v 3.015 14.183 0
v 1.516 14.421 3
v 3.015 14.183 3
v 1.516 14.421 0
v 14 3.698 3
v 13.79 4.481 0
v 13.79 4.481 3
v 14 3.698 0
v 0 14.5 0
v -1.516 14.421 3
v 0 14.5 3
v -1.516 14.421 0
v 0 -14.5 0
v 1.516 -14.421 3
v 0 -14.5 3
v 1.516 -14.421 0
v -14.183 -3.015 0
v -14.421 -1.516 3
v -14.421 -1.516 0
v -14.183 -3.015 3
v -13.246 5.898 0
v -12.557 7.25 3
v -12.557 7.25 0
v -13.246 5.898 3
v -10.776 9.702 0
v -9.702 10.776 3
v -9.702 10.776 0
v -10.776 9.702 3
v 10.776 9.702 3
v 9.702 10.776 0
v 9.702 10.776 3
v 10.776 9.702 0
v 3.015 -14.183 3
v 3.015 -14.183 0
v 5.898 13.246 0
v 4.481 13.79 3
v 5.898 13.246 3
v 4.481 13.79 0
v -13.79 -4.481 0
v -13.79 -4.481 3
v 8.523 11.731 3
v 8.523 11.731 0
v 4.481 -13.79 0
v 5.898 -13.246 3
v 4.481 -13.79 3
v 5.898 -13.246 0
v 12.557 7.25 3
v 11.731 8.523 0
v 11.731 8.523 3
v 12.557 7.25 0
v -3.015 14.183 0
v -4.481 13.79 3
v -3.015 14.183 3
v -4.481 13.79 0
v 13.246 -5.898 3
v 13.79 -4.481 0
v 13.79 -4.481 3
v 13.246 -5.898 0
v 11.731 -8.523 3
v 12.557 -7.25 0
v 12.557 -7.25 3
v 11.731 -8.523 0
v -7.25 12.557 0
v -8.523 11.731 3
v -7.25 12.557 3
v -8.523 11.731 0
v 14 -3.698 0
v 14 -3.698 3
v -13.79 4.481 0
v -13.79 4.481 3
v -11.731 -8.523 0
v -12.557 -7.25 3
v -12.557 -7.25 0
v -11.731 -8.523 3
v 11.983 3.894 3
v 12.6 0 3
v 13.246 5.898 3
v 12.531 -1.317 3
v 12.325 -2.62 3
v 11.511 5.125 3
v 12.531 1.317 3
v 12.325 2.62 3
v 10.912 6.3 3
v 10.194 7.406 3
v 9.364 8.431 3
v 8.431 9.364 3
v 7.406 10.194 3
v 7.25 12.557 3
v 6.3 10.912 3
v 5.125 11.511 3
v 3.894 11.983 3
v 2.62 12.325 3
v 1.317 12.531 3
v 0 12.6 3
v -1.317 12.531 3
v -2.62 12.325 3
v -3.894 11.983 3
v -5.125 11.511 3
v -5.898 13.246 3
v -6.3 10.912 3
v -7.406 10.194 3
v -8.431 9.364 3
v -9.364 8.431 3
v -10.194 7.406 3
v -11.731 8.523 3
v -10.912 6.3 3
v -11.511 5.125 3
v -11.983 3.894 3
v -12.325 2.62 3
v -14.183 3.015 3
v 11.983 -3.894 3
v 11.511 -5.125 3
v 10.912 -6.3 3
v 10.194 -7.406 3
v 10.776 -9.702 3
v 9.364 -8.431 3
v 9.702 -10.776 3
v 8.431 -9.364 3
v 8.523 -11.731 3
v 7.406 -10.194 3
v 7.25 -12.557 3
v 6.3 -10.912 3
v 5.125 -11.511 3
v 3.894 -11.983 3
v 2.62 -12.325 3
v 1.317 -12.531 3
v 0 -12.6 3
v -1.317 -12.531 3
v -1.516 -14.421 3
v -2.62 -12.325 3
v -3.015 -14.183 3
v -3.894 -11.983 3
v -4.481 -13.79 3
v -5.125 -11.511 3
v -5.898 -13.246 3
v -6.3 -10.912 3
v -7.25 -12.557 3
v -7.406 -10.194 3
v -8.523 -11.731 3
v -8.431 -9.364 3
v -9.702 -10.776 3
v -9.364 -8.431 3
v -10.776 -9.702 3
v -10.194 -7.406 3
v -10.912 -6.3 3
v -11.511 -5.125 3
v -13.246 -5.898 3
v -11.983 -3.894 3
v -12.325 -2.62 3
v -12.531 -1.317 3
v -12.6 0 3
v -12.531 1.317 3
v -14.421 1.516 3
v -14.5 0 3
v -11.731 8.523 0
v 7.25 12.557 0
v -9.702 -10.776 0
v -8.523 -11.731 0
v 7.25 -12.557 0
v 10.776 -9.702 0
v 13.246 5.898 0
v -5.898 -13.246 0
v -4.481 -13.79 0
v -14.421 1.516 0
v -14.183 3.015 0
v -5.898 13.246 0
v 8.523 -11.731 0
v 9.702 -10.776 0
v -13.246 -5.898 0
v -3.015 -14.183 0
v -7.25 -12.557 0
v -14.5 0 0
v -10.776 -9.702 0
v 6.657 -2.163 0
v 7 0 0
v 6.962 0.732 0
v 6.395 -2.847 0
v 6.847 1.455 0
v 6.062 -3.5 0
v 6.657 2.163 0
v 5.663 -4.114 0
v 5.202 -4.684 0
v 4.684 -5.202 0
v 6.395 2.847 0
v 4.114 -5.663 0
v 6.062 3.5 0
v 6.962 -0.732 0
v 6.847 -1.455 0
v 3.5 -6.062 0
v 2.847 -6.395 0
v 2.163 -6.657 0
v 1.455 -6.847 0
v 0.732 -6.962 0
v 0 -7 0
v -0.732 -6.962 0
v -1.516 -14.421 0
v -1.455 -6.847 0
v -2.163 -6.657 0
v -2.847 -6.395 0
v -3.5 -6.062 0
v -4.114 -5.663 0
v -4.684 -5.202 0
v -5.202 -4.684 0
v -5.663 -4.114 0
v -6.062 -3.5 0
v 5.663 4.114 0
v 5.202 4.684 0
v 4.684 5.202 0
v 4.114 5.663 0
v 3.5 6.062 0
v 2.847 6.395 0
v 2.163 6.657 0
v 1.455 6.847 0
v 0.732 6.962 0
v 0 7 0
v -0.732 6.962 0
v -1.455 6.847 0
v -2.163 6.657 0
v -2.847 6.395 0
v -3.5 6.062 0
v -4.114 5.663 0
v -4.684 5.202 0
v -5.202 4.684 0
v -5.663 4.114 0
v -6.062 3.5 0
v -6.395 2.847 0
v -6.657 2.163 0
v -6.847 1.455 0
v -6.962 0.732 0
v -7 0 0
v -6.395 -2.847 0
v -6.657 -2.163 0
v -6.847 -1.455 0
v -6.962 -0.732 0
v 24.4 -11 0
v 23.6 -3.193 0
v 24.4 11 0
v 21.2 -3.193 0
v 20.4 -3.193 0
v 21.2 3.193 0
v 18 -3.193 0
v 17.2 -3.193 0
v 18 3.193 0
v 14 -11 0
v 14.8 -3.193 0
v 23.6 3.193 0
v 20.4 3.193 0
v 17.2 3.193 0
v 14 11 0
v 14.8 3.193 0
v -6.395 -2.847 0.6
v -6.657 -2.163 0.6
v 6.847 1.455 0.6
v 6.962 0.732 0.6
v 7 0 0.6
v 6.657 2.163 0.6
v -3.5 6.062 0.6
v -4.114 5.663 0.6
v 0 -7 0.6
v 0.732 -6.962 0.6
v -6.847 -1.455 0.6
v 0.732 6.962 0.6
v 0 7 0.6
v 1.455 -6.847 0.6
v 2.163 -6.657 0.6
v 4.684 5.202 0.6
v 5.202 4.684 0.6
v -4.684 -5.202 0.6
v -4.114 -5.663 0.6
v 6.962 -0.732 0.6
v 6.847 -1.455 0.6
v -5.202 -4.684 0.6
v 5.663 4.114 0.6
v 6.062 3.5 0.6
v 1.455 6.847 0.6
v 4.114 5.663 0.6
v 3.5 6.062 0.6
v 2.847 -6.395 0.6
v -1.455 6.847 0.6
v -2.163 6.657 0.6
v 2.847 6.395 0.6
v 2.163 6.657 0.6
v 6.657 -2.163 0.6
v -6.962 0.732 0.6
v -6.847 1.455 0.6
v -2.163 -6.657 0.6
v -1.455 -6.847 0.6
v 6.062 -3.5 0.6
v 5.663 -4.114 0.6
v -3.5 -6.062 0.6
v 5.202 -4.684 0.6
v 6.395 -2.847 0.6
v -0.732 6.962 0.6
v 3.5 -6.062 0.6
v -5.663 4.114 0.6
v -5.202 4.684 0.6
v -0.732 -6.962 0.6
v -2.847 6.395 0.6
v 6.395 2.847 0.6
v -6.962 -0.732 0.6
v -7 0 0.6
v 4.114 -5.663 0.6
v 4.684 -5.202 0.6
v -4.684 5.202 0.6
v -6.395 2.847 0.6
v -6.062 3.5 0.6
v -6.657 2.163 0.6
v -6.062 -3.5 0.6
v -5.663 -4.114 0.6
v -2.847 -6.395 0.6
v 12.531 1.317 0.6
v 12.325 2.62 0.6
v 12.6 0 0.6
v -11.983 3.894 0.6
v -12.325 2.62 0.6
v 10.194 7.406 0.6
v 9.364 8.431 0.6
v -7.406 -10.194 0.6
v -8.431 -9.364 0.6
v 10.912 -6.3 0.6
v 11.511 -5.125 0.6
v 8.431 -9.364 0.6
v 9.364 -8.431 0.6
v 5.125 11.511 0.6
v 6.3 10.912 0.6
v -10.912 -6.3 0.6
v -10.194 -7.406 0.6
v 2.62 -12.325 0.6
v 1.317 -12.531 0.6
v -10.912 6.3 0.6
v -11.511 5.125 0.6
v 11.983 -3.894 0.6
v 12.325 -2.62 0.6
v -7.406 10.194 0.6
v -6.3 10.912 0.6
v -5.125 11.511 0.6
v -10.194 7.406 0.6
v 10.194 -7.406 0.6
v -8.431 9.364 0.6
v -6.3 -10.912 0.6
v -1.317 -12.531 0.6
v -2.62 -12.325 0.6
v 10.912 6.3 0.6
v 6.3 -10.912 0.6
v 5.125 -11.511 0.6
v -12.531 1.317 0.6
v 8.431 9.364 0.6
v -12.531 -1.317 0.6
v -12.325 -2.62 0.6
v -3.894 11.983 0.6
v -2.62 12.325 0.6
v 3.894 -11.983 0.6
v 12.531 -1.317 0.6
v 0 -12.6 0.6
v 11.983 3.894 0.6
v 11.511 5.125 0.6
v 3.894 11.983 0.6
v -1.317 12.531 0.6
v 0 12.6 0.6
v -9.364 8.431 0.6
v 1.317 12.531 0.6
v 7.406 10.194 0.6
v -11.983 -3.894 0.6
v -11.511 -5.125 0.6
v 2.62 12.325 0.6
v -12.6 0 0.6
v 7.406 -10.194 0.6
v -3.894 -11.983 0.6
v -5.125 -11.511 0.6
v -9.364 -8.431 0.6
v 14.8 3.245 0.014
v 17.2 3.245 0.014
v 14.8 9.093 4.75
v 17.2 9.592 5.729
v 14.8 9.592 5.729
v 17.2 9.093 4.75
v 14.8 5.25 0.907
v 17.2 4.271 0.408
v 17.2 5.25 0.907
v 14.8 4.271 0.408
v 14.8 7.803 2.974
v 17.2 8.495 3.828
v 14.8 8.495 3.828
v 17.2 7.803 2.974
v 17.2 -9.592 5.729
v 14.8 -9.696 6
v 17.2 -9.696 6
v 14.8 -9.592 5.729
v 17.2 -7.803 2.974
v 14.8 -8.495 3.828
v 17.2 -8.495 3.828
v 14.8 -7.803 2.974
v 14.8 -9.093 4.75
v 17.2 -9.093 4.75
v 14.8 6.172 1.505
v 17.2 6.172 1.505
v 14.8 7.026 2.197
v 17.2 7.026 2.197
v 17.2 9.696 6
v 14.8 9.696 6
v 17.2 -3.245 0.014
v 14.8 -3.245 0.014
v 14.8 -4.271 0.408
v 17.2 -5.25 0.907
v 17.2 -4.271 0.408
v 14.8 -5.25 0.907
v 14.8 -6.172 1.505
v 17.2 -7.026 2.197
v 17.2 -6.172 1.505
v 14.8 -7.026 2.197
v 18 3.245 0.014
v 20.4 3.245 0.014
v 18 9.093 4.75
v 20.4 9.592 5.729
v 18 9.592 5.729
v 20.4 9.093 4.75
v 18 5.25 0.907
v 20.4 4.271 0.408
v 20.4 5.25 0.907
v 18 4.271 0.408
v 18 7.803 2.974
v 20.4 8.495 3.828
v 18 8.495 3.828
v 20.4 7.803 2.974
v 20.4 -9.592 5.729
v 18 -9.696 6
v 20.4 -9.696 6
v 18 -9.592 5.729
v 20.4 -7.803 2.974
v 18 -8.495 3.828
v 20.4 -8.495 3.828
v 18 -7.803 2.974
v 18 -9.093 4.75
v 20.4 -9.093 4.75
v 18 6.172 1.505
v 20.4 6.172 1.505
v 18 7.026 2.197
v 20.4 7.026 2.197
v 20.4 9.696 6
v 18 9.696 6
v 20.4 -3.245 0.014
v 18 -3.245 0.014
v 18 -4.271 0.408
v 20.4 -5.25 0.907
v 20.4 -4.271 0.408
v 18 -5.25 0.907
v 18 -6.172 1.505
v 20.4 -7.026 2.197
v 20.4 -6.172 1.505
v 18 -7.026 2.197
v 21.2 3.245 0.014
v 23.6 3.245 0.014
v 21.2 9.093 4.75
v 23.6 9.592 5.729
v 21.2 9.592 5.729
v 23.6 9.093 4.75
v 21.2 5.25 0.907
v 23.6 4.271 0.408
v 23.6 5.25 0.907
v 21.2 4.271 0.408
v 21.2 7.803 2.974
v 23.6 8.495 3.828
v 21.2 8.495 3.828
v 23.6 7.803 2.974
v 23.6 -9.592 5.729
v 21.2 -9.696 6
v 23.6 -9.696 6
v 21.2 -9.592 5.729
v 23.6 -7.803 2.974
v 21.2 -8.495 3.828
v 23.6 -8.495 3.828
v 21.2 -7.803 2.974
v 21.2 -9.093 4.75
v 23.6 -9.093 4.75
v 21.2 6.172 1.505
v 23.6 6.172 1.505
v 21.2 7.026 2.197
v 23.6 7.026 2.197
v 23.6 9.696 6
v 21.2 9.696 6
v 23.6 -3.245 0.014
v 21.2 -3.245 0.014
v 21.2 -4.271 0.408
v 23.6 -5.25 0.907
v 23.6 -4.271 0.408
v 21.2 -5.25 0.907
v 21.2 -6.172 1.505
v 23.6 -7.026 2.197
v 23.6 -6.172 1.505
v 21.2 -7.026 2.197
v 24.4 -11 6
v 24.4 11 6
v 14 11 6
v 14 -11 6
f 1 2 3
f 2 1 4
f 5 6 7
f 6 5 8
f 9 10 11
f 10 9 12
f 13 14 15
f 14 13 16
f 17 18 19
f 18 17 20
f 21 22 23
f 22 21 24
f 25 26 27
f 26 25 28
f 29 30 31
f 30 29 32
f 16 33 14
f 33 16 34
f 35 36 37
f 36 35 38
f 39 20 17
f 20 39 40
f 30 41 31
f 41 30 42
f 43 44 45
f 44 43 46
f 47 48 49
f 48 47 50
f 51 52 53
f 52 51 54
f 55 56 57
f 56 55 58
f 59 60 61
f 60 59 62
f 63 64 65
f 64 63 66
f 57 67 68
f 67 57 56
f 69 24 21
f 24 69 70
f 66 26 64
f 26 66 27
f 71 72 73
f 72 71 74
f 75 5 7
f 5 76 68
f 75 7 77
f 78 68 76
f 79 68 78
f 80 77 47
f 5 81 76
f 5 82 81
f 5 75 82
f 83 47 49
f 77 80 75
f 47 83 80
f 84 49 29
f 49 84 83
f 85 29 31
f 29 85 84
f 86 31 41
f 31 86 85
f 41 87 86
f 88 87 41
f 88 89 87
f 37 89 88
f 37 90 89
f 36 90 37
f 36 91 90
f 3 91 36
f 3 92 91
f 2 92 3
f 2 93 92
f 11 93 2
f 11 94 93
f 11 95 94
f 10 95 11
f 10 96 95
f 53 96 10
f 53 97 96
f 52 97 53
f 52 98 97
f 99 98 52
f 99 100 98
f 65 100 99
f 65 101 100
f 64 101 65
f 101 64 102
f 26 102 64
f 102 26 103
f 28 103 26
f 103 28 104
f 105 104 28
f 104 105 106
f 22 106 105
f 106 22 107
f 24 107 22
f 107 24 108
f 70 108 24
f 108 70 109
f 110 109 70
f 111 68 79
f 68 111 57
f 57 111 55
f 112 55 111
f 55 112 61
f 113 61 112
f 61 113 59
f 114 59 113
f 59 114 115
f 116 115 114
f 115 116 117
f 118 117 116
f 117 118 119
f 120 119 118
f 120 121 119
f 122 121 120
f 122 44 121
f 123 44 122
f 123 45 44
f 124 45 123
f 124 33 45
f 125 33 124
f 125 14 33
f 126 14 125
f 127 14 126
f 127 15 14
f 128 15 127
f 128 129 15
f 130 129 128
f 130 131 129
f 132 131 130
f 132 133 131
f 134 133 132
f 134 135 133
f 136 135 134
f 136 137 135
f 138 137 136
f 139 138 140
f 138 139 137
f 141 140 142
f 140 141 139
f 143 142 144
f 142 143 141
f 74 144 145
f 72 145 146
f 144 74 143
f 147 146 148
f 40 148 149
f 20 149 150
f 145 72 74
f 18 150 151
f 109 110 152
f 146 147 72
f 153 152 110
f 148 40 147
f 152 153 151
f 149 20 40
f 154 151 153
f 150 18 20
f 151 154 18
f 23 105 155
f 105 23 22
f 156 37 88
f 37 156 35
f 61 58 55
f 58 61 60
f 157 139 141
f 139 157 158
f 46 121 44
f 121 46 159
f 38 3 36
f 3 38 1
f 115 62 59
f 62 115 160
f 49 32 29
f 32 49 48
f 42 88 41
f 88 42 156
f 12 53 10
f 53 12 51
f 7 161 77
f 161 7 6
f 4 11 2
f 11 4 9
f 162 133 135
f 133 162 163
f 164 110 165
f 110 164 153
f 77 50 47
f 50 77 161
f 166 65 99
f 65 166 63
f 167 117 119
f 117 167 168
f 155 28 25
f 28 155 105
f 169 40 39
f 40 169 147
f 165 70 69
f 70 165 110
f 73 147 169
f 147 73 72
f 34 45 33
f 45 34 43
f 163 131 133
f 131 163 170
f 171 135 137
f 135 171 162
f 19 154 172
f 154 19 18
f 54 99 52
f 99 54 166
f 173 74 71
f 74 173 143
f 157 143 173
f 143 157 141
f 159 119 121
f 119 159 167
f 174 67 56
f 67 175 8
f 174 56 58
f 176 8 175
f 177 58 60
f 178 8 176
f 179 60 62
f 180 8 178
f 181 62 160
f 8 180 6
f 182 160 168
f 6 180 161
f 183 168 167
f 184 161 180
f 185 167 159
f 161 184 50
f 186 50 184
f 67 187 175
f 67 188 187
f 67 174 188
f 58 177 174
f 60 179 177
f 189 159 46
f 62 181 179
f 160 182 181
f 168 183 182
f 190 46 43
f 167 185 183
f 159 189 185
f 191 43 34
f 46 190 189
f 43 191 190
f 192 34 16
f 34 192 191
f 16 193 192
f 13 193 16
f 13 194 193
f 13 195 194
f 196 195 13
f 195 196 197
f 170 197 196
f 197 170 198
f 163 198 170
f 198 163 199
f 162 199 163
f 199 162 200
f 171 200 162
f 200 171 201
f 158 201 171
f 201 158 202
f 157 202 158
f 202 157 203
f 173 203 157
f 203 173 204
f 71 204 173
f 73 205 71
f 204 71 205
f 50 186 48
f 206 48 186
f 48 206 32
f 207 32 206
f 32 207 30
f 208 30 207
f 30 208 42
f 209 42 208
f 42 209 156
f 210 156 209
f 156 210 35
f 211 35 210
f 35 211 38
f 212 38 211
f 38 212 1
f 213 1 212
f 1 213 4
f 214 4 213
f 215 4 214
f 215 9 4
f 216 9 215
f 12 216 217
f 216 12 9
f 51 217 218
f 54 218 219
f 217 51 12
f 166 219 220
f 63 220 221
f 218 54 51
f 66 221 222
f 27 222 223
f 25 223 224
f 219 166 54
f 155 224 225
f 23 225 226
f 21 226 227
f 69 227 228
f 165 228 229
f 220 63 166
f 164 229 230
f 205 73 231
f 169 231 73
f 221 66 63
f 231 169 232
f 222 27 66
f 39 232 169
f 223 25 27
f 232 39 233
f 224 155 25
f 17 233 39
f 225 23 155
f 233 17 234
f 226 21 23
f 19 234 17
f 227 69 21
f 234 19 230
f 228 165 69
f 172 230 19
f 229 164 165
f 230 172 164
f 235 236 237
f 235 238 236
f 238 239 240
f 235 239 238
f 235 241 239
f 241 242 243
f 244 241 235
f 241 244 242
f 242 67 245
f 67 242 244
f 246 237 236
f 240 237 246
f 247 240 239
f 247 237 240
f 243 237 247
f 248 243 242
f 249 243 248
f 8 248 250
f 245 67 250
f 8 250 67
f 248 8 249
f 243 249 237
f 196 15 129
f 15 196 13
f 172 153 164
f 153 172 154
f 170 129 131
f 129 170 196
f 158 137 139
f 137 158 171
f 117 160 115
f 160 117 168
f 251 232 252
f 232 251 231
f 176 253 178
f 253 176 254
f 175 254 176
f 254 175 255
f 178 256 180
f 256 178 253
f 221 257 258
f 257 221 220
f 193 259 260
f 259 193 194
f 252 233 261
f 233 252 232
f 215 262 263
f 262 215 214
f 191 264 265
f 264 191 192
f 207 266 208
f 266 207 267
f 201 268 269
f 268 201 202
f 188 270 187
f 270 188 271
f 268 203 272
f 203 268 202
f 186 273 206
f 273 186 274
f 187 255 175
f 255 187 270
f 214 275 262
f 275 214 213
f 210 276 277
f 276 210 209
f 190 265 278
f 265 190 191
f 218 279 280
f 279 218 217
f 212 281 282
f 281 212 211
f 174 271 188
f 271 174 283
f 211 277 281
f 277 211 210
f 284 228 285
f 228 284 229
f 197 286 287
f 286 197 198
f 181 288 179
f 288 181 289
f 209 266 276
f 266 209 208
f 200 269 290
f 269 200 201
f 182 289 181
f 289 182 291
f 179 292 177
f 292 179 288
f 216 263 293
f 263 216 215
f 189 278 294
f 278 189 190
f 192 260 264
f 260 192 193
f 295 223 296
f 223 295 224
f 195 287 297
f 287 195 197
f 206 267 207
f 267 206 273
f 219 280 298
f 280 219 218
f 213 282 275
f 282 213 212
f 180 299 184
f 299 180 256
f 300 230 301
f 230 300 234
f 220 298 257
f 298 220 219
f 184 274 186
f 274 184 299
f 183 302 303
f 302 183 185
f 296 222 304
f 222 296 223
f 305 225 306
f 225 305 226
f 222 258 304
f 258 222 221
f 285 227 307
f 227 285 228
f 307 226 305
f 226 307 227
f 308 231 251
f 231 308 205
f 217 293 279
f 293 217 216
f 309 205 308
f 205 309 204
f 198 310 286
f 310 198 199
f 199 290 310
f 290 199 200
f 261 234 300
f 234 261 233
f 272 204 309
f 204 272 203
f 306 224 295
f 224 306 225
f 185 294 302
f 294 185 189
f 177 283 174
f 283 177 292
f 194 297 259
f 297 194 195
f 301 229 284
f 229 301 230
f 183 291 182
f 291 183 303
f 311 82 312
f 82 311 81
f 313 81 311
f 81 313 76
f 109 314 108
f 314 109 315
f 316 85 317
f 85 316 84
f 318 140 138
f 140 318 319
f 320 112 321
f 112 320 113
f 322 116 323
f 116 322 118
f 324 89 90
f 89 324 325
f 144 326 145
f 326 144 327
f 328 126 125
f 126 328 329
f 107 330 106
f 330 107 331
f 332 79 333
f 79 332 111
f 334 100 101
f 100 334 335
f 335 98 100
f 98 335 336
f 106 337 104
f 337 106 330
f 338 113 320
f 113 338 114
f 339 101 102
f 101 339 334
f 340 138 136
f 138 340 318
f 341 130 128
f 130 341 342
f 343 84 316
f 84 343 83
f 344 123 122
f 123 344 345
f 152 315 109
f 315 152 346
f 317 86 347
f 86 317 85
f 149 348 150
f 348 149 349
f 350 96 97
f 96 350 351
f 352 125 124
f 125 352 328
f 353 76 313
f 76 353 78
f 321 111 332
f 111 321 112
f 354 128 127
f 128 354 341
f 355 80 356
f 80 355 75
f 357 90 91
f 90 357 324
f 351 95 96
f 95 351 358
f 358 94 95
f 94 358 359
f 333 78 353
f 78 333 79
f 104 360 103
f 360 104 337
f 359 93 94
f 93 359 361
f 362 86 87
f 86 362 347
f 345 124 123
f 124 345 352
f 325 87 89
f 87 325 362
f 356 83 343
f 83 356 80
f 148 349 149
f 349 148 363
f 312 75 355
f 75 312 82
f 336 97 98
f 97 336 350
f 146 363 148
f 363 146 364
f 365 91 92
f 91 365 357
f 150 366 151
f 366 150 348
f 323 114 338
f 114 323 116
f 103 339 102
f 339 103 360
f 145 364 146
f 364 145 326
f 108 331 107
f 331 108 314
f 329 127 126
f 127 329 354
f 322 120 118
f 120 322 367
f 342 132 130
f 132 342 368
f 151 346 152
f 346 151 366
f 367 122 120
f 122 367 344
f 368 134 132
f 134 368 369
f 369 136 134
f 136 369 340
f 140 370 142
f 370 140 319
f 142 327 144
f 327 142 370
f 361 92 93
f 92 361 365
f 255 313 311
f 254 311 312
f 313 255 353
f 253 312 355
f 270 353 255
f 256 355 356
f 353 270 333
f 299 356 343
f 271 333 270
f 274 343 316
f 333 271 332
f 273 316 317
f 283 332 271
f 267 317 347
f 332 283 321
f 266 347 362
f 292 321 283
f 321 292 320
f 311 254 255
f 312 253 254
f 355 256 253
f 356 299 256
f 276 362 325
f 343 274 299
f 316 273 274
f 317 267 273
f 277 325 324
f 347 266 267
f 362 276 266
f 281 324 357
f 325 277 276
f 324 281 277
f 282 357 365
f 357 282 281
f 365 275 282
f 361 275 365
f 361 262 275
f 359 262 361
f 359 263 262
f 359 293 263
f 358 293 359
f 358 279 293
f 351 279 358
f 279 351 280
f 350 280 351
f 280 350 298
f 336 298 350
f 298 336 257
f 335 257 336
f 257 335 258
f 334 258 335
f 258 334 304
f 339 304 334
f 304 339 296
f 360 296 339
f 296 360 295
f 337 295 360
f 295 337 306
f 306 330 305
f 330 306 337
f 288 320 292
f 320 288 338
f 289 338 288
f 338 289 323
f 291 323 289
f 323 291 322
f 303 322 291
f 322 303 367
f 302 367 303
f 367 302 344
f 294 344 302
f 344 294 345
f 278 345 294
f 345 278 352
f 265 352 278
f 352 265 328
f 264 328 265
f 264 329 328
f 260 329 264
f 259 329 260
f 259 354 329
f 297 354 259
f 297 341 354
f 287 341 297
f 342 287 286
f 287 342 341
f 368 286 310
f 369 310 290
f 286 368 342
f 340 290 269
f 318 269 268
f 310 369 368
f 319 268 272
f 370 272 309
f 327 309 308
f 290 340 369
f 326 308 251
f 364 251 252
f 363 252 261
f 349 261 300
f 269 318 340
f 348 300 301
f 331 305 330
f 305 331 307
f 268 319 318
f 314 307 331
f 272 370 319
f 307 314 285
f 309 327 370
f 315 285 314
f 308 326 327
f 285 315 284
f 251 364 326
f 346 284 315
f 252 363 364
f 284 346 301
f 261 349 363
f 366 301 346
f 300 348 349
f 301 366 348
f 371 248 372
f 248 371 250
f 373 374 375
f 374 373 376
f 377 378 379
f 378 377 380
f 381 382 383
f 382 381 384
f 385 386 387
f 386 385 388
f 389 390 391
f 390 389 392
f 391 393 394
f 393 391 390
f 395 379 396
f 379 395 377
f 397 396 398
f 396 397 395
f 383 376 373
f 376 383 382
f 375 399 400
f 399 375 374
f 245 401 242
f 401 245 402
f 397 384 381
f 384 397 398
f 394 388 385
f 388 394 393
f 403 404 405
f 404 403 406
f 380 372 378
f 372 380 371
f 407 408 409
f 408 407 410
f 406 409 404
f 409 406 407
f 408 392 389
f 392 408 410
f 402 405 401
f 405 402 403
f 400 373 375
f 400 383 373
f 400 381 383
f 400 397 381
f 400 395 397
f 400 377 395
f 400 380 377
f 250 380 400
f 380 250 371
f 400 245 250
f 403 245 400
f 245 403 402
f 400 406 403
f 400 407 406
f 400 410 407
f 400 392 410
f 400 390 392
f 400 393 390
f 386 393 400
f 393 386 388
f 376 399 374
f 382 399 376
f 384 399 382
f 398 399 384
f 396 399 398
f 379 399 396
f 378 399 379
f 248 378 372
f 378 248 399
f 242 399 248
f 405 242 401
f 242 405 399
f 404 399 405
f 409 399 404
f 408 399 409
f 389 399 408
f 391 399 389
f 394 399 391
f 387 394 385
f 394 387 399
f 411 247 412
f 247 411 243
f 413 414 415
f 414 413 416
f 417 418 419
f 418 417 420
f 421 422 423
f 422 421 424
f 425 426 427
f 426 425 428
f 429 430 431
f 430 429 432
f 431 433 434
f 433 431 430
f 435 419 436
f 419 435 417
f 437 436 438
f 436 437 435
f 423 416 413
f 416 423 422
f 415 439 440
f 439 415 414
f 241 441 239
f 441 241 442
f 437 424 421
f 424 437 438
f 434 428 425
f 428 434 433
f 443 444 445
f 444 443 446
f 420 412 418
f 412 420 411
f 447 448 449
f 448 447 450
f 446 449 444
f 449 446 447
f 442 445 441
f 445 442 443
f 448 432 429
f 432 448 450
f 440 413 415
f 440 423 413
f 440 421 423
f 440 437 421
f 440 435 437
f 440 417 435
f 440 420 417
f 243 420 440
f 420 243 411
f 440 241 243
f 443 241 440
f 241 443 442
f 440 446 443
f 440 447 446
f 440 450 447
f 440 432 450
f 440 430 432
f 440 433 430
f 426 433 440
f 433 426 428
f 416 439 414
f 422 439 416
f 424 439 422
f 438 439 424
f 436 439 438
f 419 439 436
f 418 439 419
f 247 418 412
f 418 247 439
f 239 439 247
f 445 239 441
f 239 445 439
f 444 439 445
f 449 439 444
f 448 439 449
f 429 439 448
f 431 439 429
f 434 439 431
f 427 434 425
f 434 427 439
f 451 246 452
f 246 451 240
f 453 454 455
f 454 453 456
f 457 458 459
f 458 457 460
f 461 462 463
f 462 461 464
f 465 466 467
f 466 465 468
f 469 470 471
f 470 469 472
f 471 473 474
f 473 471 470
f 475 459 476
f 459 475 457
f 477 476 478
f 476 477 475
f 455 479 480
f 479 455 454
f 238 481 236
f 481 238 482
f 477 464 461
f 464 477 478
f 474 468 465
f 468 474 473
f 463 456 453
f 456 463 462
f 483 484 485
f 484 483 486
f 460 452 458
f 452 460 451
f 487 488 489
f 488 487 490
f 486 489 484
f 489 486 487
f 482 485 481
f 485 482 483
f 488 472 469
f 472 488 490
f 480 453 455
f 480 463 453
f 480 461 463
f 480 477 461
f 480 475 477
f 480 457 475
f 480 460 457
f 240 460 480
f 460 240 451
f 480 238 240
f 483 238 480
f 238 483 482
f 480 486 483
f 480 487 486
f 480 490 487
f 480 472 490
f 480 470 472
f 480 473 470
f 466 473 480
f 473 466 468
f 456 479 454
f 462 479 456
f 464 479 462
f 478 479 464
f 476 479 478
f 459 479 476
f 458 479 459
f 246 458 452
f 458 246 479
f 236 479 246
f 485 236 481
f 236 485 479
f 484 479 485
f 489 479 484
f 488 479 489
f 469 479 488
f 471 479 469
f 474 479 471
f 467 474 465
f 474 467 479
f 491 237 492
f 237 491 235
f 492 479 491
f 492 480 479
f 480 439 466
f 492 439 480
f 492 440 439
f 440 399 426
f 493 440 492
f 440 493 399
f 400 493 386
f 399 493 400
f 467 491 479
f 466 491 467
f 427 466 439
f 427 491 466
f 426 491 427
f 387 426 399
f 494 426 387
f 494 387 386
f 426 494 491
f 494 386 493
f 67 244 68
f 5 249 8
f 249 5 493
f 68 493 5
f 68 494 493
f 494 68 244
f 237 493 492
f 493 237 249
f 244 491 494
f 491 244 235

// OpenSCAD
diameter = 25; // [25,45,50,60]

slots = 3; // [1,2,3,4,5,6,7,8]

$fn=60;

module ring(diam,wells) {
    $fn = 60;
    difference() {
        cylinder(d=diam+4,h=3);
        translate([0,0,-1]) cylinder(d=diam-11,h=5);
        translate([0,0,0.6]) cylinder(d=diam+0.2,h=5);
    }
    translate([diam/2+1.5,0,0]) {
        th = 2.4;
        wa = 0.8;
        difference() {
            translate([0,-11,0]) cube([th*wells+wa*(wells+1),22,6]);
            for (i=[0:wells-1])
                translate([wa + i * (th+wa),0,10]) rotate([0,90,0]) cylinder(d=21,h=th);
        }
    }
}

ring(diameter, slots);
